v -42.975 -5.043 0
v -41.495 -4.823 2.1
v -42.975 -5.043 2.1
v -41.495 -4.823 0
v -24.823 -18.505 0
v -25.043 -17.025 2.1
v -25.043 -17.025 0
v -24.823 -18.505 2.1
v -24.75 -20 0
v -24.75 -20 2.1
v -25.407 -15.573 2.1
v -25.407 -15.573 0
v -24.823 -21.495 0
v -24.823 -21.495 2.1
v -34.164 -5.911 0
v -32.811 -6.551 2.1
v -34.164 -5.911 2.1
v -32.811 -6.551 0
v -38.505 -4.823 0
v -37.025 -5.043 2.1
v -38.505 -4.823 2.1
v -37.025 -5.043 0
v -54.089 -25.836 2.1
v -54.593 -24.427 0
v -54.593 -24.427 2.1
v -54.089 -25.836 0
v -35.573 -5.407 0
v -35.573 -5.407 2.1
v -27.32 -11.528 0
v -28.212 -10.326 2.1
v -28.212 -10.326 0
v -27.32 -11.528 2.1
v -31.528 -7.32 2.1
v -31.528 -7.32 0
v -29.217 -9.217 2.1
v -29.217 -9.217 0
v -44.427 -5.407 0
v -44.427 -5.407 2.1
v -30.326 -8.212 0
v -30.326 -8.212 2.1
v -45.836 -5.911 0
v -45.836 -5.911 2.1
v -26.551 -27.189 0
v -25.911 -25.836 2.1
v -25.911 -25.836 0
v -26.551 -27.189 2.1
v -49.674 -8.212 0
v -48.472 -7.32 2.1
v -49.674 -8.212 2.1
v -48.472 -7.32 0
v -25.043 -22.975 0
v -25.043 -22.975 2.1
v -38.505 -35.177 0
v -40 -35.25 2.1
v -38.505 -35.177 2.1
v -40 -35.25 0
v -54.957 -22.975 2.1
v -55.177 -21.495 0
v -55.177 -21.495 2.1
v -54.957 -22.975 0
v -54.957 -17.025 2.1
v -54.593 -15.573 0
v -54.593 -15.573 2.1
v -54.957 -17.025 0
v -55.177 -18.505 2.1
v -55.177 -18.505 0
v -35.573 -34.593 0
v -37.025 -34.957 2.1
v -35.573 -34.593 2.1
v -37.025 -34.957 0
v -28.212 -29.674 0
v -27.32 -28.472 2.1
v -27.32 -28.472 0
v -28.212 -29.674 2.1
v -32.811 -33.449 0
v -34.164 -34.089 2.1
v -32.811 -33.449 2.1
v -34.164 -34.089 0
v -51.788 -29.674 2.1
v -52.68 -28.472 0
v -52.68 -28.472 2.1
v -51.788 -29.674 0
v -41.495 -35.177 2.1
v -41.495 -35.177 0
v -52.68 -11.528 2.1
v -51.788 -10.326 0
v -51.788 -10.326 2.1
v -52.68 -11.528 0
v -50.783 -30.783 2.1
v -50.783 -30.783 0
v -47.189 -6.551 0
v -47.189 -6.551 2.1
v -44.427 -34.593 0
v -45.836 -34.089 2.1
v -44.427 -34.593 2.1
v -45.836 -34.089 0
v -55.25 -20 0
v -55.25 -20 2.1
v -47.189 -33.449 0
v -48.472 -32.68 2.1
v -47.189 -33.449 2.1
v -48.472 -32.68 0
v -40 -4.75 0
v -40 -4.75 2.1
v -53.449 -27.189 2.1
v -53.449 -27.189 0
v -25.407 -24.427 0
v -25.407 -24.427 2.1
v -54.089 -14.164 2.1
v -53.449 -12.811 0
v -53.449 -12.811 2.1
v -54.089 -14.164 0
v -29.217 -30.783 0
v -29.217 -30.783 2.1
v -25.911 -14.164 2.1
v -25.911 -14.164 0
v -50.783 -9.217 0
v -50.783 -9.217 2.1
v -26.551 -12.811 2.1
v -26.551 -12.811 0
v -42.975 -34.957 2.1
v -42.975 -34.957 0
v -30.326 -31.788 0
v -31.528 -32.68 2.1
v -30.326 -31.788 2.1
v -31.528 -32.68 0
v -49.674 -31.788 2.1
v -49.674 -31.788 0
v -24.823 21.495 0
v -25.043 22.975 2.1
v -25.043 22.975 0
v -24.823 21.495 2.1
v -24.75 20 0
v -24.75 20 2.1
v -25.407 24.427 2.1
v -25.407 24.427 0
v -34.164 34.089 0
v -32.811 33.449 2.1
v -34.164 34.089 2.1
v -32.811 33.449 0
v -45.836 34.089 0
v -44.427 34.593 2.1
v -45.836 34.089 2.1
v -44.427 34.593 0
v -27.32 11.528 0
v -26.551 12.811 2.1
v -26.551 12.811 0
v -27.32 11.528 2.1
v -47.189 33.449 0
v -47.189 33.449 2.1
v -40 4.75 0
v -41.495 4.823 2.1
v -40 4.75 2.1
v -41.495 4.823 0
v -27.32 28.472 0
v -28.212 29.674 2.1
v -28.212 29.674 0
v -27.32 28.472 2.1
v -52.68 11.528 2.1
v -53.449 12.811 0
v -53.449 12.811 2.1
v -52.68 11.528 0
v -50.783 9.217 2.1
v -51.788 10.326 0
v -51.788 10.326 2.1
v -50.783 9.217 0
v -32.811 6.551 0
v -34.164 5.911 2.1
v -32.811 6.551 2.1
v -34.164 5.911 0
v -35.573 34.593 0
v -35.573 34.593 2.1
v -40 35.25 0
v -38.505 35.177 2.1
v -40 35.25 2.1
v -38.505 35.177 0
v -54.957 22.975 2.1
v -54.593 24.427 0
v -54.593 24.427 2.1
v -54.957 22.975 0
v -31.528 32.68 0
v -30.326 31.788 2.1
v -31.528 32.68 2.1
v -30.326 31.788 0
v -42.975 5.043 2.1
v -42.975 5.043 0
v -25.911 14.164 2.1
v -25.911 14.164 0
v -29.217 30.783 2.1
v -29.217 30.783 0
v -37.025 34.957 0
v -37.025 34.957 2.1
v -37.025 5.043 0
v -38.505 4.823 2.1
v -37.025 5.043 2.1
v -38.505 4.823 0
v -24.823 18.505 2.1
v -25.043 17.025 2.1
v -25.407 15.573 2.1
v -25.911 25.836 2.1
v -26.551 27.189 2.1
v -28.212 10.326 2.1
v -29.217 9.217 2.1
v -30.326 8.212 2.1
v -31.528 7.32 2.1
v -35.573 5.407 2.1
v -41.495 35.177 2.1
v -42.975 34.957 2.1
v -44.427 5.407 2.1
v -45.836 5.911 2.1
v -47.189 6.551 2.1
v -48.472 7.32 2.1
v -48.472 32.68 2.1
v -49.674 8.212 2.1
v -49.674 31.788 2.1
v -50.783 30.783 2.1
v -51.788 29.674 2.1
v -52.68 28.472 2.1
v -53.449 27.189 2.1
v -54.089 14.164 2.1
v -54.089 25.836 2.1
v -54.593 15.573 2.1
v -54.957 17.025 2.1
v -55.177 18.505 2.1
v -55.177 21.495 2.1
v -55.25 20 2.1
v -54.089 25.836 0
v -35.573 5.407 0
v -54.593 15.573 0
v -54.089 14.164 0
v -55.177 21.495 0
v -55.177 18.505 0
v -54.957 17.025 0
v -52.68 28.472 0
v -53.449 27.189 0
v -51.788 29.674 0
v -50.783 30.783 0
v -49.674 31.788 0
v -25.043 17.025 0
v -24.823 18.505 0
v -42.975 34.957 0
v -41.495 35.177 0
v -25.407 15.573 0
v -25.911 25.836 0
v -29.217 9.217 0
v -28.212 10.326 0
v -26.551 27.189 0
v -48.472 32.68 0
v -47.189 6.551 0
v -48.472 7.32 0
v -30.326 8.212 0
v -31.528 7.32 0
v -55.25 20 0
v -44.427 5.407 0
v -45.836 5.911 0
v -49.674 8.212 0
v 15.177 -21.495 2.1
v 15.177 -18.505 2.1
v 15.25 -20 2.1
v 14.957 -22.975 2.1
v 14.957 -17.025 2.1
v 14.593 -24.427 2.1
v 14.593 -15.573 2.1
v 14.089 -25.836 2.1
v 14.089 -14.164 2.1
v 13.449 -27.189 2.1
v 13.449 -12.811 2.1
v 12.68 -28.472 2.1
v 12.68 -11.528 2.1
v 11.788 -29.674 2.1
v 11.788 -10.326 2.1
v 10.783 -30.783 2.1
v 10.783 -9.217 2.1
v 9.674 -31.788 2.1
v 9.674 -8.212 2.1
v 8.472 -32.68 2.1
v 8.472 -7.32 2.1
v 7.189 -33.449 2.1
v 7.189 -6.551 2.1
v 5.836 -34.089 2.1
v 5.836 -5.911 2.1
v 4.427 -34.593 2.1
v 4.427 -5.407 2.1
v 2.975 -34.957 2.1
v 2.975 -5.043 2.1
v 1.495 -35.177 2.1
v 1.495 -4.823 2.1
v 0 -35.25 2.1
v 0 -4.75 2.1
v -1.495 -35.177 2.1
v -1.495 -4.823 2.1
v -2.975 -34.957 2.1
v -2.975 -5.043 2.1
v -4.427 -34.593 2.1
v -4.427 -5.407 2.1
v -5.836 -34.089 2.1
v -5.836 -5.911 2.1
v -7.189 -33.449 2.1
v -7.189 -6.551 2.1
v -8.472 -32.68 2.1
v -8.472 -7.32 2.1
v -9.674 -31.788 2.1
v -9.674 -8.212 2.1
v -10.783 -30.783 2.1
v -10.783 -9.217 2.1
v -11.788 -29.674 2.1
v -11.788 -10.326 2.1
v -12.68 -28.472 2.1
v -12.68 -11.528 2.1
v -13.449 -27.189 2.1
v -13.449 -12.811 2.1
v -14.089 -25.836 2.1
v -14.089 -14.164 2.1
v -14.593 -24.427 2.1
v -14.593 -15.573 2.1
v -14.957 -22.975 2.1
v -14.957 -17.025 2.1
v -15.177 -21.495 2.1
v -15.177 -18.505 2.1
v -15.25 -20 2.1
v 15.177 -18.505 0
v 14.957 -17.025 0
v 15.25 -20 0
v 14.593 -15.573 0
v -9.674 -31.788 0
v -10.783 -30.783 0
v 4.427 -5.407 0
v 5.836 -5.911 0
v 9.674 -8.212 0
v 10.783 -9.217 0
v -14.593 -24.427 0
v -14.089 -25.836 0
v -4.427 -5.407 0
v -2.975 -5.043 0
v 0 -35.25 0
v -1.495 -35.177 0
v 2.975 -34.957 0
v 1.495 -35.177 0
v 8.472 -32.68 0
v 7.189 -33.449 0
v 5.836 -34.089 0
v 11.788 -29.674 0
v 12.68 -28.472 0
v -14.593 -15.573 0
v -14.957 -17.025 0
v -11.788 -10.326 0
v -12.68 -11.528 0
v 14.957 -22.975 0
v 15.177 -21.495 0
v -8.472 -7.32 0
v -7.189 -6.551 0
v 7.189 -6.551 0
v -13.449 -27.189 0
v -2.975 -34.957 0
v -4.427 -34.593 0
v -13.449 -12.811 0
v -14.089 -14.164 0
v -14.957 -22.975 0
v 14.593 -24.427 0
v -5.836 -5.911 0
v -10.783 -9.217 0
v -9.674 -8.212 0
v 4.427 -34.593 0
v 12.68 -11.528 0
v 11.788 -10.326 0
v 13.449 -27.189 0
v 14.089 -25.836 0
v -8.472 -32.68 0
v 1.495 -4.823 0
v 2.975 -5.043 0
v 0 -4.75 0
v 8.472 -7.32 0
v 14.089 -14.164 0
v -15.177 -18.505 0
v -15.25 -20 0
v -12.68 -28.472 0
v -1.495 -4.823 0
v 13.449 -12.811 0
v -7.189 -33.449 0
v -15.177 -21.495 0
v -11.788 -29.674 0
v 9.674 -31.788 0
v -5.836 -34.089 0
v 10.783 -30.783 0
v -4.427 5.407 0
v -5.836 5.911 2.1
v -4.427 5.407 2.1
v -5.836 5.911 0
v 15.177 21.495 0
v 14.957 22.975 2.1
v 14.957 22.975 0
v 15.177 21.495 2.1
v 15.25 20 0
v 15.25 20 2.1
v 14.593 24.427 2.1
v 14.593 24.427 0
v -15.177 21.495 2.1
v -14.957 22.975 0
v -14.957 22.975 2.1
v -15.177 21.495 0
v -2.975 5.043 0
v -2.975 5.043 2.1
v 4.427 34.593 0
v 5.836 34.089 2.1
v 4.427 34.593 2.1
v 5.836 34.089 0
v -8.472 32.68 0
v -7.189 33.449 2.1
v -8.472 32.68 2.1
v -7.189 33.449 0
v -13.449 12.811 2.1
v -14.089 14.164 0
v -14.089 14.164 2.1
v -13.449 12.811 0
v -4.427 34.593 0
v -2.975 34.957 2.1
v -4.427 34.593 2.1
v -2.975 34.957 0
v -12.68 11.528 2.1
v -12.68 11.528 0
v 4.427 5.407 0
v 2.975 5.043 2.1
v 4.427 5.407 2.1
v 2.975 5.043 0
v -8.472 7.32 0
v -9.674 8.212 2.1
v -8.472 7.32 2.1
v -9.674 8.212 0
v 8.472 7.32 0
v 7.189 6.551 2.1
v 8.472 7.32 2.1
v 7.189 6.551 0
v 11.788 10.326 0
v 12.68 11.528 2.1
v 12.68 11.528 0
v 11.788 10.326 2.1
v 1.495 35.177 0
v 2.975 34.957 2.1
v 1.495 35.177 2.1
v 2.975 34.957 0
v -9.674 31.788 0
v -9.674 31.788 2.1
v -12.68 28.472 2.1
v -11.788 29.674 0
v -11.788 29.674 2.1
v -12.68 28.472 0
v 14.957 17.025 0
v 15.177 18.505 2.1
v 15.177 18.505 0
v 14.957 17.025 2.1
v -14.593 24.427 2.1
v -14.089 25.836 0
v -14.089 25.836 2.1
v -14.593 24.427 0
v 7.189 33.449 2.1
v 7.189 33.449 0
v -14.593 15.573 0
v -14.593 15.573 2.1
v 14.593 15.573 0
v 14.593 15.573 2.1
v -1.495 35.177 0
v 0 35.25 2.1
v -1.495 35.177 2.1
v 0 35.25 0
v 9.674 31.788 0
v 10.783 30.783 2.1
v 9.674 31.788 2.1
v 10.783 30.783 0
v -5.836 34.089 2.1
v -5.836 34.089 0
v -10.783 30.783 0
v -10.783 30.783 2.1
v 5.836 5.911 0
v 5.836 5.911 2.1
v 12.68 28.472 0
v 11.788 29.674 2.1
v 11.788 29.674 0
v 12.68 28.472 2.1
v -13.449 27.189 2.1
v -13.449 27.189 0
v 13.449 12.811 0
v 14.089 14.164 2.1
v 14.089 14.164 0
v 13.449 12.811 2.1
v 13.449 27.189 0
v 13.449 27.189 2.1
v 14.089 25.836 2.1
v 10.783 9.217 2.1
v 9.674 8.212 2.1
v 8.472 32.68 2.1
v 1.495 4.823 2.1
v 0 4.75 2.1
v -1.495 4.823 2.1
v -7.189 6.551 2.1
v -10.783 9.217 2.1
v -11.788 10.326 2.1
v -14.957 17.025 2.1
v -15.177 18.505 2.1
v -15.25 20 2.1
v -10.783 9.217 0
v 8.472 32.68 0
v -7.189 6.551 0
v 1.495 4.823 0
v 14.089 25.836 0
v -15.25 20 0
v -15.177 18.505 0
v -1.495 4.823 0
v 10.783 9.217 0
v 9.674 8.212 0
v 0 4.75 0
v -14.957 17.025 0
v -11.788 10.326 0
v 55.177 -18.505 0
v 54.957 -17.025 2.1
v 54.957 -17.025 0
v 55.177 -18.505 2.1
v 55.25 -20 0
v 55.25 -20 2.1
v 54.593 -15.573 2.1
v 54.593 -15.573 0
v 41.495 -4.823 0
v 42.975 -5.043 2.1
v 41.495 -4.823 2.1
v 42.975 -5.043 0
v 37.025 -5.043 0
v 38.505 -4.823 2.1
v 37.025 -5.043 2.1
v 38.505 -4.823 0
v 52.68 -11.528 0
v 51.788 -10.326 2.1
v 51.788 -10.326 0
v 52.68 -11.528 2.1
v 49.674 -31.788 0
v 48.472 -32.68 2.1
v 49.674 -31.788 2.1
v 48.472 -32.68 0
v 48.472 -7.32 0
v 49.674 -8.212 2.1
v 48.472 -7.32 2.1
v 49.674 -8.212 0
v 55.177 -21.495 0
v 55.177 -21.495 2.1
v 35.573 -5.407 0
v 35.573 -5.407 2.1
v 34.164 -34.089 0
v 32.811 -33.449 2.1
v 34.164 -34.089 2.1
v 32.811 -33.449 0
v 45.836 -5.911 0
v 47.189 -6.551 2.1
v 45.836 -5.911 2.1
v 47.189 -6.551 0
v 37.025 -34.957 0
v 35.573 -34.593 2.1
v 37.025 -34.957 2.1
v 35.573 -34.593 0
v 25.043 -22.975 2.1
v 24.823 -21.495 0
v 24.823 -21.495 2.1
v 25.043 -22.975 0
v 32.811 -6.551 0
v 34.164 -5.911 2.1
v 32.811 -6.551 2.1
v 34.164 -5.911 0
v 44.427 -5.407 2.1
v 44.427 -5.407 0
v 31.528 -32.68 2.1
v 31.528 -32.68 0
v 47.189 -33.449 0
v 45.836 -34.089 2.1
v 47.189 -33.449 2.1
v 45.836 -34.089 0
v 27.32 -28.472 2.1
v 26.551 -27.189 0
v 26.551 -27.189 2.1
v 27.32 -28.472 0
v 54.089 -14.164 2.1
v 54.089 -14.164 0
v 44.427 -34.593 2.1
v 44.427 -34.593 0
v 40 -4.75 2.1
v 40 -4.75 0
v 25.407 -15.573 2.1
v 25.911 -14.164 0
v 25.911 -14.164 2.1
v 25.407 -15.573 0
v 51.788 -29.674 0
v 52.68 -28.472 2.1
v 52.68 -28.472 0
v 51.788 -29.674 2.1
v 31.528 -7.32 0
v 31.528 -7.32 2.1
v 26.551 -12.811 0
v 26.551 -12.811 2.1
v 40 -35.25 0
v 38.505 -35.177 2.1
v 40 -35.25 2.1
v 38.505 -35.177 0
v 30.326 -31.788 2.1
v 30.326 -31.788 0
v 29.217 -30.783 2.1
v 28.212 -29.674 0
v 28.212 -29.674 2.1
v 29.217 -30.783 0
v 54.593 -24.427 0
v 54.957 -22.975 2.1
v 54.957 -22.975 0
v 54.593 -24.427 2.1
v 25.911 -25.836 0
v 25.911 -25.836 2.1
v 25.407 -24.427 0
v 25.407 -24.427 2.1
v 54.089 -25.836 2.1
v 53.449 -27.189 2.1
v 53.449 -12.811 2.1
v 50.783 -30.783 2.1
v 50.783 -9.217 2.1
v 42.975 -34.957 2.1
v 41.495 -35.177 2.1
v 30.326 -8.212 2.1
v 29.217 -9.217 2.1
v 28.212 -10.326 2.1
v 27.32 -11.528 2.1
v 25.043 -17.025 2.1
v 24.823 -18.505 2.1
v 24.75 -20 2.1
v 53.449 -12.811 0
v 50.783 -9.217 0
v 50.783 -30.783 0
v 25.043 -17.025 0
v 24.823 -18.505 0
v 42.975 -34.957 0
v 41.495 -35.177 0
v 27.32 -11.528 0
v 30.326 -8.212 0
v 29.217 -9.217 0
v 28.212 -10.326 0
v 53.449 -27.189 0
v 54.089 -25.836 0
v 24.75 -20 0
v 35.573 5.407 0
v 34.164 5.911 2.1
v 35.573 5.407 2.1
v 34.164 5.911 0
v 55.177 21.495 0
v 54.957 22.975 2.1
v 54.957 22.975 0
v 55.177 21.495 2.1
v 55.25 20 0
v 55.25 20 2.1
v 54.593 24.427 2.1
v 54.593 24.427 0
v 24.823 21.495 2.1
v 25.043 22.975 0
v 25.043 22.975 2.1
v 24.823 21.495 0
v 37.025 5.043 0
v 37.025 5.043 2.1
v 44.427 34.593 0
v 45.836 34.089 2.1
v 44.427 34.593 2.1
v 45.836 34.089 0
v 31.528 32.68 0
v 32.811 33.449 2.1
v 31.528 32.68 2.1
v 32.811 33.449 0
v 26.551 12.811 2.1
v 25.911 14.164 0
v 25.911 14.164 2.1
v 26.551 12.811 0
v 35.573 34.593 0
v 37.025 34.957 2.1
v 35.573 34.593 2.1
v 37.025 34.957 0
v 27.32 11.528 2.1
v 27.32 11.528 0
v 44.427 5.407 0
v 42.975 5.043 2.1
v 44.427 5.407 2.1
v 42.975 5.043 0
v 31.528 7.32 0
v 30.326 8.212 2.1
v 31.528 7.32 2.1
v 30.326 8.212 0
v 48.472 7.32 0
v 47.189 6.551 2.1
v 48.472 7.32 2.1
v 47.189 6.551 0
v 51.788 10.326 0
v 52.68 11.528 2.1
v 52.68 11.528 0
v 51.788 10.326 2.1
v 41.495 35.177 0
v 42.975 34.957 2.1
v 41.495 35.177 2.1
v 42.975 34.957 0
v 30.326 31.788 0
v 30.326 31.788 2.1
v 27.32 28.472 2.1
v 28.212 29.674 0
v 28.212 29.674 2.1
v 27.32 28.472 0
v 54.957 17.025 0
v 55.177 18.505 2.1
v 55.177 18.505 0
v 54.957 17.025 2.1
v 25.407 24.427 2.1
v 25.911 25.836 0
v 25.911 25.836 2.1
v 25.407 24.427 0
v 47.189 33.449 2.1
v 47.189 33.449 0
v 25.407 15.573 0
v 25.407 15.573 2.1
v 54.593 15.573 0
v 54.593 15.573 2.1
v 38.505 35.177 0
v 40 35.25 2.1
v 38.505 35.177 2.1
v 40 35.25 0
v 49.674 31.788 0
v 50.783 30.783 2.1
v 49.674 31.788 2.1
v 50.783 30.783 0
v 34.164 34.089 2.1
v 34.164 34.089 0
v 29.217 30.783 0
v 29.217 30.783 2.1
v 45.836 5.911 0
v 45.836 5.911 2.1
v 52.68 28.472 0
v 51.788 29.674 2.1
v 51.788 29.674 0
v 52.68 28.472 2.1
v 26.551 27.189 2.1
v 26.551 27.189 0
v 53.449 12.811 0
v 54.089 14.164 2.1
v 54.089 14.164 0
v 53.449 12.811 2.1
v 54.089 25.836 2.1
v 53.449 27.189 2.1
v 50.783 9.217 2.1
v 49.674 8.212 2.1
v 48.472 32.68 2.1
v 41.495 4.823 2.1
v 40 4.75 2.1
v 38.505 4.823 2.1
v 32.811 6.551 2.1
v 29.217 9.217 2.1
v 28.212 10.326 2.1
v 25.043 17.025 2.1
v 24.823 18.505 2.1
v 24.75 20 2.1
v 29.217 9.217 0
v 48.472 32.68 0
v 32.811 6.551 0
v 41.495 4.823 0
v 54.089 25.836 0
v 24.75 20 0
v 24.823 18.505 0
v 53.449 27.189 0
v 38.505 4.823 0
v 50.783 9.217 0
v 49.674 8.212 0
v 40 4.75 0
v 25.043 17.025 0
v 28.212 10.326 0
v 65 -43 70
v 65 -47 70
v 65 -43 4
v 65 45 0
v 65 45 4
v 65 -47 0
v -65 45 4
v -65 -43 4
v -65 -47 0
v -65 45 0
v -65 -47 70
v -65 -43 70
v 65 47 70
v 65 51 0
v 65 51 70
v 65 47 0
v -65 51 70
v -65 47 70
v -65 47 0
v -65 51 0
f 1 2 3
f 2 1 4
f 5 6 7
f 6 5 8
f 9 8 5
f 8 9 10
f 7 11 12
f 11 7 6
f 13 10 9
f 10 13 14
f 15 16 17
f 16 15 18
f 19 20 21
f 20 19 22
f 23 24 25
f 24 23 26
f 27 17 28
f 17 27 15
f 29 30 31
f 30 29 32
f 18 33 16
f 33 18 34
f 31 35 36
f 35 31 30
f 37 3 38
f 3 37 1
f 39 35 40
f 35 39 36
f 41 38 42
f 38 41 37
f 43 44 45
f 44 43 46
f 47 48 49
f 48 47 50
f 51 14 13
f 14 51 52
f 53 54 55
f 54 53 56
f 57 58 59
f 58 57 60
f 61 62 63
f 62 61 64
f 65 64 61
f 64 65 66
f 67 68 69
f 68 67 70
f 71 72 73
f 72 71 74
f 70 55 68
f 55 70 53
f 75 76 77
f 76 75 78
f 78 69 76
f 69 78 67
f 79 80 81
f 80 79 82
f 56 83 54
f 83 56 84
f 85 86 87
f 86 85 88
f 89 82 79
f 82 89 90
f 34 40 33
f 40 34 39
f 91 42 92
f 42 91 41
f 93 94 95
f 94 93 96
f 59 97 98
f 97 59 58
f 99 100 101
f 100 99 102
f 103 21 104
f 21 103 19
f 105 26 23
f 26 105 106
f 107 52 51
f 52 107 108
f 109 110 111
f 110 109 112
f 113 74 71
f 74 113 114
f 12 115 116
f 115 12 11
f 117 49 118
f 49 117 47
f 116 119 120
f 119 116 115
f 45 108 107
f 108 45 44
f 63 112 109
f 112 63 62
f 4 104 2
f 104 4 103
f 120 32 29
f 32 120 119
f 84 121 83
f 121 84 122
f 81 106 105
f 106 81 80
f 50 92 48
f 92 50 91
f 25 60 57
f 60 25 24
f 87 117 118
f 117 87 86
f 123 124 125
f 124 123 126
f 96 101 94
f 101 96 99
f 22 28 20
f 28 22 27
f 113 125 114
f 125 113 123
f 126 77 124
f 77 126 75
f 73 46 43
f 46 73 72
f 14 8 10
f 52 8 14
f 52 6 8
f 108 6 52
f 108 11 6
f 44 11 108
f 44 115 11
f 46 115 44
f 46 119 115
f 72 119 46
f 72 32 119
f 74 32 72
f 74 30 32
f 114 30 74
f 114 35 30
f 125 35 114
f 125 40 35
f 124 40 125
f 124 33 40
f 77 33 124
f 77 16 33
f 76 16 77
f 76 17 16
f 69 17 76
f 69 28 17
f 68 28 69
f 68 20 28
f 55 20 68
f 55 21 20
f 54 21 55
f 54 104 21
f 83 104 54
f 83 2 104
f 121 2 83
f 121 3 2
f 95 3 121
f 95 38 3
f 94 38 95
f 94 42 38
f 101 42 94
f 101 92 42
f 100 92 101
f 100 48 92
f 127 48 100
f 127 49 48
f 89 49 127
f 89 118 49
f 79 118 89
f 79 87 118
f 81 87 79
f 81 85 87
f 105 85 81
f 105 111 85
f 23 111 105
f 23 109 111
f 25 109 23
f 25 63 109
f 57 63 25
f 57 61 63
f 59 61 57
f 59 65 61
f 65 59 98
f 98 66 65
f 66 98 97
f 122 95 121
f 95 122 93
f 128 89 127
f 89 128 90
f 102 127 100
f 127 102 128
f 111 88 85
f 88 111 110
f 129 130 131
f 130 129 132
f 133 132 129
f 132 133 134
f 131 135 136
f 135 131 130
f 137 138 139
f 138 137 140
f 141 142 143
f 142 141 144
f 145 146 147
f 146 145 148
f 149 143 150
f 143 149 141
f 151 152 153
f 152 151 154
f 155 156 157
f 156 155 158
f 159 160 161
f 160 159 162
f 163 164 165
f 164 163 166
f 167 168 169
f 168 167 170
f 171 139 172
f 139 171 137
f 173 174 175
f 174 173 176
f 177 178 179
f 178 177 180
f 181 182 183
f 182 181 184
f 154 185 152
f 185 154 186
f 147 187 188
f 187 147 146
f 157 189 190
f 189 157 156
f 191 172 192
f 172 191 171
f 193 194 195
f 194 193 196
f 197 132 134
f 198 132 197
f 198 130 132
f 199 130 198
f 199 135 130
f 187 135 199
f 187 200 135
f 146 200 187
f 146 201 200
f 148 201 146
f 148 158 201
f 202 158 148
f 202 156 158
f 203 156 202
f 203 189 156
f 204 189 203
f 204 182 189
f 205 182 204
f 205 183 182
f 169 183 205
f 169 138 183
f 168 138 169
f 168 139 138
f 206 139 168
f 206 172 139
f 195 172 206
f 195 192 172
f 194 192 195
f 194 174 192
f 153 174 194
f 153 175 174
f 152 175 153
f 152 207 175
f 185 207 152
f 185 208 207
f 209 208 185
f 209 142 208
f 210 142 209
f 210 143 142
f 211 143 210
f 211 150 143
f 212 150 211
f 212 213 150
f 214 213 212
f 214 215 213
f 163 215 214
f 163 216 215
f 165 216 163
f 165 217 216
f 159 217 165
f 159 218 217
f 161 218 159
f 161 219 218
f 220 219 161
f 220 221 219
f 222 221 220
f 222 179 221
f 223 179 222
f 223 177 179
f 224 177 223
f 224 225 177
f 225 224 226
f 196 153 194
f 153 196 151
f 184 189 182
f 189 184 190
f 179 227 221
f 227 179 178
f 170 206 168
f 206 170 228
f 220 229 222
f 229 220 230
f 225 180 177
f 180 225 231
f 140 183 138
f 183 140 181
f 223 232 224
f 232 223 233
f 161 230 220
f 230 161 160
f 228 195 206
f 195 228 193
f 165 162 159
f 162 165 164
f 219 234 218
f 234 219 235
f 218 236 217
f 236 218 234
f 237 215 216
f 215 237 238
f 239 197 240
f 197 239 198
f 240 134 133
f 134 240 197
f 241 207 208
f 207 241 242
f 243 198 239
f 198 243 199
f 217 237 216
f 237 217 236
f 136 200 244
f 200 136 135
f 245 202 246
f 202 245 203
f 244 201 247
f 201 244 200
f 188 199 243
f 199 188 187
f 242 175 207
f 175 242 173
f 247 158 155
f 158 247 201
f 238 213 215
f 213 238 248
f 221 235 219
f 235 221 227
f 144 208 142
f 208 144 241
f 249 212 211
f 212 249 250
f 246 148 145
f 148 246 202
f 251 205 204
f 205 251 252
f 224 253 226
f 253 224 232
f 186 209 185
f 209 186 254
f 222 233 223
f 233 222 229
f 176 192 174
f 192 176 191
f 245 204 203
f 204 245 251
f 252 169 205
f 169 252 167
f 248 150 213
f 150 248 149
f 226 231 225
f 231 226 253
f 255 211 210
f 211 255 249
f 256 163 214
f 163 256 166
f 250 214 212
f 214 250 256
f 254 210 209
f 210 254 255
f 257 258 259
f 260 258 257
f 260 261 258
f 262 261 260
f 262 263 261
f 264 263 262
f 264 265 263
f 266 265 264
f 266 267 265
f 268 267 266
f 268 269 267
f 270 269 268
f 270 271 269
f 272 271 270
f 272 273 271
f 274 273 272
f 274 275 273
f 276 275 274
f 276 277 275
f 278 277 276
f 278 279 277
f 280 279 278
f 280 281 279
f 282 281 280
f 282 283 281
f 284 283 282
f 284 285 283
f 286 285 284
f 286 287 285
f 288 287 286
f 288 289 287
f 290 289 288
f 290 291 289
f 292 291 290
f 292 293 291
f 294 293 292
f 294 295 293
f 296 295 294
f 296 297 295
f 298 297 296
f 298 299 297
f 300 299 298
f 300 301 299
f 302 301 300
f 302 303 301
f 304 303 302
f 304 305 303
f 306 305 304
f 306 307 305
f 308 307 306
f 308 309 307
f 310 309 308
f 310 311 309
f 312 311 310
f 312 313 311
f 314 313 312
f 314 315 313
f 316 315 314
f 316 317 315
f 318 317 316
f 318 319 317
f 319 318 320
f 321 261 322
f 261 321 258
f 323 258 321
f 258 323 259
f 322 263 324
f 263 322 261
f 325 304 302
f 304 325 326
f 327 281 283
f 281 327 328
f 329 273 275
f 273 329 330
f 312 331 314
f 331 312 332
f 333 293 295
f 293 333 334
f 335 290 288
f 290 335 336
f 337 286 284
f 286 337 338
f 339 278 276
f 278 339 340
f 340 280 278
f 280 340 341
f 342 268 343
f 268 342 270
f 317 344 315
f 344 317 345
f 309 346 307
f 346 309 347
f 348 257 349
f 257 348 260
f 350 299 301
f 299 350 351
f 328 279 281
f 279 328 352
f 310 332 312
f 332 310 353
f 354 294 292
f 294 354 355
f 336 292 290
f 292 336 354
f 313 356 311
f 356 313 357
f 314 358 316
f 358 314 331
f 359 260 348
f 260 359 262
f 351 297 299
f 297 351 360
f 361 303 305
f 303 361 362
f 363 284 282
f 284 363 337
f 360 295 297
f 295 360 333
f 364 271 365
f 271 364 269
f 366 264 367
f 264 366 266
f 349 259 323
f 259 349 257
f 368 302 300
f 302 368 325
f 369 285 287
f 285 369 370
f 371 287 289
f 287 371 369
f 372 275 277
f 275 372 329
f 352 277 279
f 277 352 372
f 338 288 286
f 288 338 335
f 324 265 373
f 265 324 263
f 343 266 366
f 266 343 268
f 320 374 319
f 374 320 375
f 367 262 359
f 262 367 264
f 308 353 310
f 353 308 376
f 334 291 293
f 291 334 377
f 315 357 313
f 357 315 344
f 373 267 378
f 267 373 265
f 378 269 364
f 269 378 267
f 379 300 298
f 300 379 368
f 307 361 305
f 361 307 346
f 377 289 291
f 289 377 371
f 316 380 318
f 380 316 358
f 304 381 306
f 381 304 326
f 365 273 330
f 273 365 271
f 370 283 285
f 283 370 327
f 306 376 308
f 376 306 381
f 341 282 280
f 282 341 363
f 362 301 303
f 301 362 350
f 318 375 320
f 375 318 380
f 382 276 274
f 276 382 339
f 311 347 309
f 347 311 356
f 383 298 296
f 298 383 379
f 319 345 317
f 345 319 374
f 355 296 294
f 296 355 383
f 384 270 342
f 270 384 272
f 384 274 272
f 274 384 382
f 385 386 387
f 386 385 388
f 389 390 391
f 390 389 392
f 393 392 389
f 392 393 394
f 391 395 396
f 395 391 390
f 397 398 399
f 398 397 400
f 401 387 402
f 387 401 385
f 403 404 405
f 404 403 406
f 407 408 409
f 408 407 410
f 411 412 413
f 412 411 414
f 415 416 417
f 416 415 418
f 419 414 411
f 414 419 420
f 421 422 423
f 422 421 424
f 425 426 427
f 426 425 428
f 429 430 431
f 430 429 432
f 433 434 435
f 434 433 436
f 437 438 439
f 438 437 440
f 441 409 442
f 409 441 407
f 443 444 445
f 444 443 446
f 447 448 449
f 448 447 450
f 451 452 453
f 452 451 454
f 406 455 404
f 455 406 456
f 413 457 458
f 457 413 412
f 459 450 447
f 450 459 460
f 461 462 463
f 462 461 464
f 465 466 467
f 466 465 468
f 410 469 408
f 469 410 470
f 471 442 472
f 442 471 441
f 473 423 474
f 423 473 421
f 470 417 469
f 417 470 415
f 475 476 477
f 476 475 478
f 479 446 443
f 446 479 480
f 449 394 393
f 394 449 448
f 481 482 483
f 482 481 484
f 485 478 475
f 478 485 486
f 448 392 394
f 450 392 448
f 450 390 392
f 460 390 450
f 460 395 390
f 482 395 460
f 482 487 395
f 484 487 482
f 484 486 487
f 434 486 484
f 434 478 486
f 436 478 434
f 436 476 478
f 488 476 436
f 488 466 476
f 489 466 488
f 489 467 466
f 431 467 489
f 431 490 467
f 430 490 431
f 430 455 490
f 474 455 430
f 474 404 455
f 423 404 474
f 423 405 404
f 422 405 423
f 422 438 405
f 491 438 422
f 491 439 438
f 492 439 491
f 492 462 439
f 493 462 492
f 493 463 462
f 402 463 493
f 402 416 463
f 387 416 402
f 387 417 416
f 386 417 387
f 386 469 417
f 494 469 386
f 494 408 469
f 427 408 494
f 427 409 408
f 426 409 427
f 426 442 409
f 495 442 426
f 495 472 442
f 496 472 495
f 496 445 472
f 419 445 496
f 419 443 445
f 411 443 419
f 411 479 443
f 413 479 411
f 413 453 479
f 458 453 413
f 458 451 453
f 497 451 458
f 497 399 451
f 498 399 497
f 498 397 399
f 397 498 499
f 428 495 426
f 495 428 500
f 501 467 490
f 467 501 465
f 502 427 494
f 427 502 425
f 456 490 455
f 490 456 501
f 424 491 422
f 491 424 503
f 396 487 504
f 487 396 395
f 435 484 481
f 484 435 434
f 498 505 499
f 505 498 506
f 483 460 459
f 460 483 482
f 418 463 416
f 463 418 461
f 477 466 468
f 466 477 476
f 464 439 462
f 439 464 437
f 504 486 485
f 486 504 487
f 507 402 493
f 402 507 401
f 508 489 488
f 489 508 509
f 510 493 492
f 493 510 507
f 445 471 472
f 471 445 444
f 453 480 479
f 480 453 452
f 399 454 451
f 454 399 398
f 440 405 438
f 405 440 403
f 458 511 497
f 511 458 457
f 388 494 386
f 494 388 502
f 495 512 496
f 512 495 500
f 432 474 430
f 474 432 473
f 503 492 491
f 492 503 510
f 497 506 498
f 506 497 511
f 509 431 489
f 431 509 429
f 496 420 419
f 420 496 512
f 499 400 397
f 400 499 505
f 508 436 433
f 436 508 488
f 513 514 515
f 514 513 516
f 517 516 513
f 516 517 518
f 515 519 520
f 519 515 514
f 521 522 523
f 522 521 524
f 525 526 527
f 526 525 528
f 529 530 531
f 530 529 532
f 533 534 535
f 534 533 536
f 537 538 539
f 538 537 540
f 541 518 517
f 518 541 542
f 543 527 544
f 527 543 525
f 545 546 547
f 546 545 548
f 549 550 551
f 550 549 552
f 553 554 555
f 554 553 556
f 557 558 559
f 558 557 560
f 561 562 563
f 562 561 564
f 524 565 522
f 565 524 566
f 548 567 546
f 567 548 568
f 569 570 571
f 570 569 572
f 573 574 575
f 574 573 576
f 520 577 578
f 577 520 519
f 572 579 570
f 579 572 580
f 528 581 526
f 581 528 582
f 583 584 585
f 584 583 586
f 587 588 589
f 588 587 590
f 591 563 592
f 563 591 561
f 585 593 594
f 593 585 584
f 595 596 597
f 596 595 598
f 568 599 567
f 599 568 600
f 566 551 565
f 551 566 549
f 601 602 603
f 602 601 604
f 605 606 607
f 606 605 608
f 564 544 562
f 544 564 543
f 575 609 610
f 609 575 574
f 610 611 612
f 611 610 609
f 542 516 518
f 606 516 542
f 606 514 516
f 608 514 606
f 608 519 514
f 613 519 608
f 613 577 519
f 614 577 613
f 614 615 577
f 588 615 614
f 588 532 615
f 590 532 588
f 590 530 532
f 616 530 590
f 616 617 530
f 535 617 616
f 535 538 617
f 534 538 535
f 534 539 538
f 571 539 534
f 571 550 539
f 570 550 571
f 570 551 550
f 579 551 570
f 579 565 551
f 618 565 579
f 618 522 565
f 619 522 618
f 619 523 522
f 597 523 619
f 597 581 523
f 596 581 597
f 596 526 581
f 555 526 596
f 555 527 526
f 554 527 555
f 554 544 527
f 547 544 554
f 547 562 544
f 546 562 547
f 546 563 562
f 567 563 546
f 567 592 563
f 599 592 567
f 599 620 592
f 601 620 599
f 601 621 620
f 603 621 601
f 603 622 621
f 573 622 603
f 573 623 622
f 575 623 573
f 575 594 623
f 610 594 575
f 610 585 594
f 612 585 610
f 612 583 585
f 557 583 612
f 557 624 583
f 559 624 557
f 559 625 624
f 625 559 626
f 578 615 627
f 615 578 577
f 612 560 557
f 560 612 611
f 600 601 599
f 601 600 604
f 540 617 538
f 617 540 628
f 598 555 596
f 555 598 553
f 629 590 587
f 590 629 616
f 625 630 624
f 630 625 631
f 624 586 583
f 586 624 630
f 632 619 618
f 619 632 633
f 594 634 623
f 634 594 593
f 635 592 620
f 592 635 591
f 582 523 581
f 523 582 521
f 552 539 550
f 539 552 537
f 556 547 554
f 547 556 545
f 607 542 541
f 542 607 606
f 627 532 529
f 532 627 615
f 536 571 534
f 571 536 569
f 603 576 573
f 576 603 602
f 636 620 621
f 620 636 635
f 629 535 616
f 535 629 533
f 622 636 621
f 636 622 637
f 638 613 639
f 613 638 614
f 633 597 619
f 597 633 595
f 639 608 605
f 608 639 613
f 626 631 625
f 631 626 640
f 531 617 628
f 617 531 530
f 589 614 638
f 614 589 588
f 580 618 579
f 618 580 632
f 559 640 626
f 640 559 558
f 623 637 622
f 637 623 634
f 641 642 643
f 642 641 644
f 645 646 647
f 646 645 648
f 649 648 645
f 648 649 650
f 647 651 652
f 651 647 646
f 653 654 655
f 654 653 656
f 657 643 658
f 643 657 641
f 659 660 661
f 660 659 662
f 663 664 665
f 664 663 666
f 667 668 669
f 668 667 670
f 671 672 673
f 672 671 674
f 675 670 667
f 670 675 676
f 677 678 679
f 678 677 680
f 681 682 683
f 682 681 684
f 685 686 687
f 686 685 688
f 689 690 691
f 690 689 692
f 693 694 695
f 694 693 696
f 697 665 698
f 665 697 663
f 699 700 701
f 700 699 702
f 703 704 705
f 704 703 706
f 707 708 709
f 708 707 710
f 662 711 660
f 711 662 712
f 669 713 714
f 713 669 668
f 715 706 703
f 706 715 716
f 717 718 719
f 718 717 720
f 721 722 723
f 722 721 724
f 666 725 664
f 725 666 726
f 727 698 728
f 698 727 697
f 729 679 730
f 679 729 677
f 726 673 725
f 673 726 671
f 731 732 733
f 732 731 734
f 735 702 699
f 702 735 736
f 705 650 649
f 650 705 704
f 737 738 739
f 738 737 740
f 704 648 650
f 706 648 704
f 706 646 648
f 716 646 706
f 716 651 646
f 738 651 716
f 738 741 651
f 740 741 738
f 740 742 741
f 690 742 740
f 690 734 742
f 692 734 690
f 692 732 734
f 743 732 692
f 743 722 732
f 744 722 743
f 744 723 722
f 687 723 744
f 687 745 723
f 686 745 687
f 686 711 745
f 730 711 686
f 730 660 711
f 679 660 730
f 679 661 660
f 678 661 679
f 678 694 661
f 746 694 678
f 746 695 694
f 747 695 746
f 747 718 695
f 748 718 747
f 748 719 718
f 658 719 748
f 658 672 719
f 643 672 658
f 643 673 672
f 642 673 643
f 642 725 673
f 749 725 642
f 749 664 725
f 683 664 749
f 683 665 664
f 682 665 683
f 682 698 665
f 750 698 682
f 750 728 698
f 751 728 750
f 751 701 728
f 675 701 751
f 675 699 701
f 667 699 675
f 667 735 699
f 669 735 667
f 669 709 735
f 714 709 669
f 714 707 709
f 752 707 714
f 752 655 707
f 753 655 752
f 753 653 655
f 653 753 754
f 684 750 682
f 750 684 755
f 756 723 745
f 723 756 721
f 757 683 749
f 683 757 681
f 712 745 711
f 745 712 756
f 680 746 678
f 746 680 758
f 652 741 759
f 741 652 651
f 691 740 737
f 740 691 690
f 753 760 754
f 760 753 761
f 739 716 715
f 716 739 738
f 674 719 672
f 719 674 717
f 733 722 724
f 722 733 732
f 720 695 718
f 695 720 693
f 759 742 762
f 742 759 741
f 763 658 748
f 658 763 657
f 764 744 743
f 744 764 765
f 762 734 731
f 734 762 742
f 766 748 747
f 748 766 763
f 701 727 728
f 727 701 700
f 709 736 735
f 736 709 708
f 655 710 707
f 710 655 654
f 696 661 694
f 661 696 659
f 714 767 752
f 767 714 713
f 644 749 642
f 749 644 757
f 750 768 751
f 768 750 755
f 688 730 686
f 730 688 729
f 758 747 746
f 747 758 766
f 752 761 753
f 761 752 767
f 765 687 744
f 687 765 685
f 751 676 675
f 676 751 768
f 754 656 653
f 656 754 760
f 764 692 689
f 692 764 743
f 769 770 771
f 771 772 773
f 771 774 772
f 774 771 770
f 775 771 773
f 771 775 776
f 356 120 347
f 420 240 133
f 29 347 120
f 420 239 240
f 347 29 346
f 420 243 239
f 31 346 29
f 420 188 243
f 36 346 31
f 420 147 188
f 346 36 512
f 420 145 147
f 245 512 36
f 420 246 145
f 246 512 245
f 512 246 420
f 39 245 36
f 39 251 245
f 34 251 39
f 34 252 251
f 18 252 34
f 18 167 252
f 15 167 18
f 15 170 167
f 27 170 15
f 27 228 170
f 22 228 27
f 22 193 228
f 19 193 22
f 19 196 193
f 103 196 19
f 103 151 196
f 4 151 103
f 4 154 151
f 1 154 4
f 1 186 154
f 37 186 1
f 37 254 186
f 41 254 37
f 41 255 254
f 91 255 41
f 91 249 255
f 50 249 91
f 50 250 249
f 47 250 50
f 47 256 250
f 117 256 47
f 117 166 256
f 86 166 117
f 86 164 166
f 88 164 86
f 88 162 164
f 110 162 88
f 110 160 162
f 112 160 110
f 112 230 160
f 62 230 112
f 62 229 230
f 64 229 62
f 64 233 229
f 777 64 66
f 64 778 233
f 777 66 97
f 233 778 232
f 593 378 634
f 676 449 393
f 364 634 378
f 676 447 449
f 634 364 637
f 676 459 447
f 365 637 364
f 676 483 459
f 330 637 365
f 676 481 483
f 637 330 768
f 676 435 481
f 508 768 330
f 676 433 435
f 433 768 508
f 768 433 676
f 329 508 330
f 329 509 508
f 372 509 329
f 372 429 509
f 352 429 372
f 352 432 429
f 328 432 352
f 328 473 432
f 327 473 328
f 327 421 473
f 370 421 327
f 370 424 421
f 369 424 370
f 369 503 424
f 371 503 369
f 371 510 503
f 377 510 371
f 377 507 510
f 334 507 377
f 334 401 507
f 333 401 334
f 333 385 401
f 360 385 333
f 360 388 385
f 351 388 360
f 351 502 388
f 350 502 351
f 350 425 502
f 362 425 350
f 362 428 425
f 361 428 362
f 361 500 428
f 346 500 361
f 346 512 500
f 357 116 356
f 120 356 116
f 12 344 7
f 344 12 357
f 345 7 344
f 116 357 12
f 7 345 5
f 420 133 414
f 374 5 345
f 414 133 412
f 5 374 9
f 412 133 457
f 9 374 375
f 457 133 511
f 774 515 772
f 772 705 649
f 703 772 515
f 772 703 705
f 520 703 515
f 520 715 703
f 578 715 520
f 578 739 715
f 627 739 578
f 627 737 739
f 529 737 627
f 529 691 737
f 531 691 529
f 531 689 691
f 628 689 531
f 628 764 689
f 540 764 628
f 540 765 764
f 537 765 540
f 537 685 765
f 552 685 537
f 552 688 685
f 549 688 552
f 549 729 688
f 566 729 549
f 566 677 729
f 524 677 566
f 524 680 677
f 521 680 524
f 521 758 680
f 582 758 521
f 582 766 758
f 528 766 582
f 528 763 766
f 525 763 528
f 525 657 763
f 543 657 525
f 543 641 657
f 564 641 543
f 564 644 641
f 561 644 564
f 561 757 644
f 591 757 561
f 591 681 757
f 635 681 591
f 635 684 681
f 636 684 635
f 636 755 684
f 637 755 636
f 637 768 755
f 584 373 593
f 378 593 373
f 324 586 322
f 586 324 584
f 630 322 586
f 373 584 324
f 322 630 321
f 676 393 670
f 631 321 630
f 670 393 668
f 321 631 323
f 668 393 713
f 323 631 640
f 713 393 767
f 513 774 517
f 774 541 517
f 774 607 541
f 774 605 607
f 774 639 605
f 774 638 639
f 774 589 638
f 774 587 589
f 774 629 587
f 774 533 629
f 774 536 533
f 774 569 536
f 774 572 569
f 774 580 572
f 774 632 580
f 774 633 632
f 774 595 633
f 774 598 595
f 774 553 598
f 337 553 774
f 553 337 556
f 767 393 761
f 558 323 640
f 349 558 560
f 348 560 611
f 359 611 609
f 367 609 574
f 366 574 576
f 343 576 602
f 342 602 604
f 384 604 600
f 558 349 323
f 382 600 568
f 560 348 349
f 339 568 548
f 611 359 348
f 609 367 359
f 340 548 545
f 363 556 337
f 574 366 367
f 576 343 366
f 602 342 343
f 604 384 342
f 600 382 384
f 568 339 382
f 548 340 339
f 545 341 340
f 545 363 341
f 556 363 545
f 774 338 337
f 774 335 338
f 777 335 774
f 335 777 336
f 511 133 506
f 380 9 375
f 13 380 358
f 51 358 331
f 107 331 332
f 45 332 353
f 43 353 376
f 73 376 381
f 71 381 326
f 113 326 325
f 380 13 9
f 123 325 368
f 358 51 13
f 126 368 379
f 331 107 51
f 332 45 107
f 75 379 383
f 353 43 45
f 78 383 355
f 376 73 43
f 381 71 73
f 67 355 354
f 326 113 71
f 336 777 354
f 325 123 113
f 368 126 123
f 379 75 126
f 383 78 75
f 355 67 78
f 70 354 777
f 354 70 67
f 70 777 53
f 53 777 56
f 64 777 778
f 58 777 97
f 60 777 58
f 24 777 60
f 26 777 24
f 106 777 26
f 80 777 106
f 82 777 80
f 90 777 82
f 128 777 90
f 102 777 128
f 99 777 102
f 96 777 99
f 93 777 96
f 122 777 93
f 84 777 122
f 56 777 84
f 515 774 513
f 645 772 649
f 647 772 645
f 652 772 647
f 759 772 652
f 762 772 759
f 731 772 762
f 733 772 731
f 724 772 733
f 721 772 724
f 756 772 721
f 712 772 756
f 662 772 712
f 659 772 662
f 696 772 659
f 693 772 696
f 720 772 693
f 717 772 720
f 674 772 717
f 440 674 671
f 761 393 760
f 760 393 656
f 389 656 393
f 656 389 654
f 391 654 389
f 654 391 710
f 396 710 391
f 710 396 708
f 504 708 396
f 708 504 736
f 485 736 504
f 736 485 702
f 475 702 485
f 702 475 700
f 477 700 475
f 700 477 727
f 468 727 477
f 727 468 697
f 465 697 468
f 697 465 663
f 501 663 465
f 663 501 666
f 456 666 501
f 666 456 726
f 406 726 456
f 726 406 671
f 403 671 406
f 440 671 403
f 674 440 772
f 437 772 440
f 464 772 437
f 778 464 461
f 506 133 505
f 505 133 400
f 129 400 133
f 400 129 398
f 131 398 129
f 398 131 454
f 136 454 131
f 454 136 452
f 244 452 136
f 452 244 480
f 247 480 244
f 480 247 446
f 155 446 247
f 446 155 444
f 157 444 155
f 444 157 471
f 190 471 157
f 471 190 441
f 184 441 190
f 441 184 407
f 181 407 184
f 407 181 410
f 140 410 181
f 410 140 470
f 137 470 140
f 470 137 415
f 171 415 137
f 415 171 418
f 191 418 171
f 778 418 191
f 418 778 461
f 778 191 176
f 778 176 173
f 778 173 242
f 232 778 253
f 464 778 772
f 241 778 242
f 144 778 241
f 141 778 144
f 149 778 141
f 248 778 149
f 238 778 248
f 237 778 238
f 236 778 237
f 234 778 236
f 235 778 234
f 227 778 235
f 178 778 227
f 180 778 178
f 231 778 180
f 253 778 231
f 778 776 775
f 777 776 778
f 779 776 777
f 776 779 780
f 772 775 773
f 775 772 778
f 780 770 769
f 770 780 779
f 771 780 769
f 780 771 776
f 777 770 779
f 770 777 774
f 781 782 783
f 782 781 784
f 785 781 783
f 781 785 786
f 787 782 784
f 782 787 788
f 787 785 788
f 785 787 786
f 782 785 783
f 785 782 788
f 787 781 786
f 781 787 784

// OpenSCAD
// Dimensions
plate_x = 130;
plate_y = 90;
plate_z = 4;

wall_height = 70;
wall_thickness = 4;

tube_hole_diameter = 30.5;

// Grid parameters
num_rows = 2; // Along Y
num_cols = 3; // Along X
pitch_x = 40;
pitch_y = 40;

// Hole centers
// X positions: -pitch_x, 0, pitch_x (centered around 0)
// Y positions: -pitch_y/2, pitch_y/2 (centered around 0)
hole_x_positions = [-pitch_x, 0, pitch_x];
hole_y_positions = [-pitch_y/2, pitch_y/2];

// Build
module rack() {
    // 1. Main Plate
    // Plate lies on z=0 to z=4.
    difference() {
        // Base plate
        translate([0, 0, plate_z/2]) {
            cube([plate_x, plate_y, plate_z], center = true);
        }
        
        // Cut holes
        for (x = hole_x_positions) {
            for (y = hole_y_positions) {
                // Extend hole slightly past z=0 and z=plate_z to ensure clean cut
                // Plate is z=0 to z=4.
                // Hole extends from -0.1 to 4.1
                translate([x, y, 0]) {
                    cylinder(d = tube_hole_diameter, h = plate_z + 0.2, center = true, $fn = 64);
                }
            }
        }
    }

    // 2. Walls
    // Wall 1 (Negative Y)
    // Plate edge is at Y = -45. Wall is 4mm thick, flush on outside.
    // Wall spans Y = -49 to -45. Center Y = -47.
    translate([-plate_x/2, -47, 0]) {
        cube([plate_x, wall_thickness, wall_height], center = false);
    }
    
    // Wall 2 (Positive Y)
    // Plate edge is at Y = 45. Wall is 4mm thick, flush on outside.
    // Wall spans Y = 45 to 49. Center Y = 47.
    translate([-plate_x/2, 47, 0]) {
        cube([plate_x, wall_thickness, wall_height], center = false);
    }
}

rack();
